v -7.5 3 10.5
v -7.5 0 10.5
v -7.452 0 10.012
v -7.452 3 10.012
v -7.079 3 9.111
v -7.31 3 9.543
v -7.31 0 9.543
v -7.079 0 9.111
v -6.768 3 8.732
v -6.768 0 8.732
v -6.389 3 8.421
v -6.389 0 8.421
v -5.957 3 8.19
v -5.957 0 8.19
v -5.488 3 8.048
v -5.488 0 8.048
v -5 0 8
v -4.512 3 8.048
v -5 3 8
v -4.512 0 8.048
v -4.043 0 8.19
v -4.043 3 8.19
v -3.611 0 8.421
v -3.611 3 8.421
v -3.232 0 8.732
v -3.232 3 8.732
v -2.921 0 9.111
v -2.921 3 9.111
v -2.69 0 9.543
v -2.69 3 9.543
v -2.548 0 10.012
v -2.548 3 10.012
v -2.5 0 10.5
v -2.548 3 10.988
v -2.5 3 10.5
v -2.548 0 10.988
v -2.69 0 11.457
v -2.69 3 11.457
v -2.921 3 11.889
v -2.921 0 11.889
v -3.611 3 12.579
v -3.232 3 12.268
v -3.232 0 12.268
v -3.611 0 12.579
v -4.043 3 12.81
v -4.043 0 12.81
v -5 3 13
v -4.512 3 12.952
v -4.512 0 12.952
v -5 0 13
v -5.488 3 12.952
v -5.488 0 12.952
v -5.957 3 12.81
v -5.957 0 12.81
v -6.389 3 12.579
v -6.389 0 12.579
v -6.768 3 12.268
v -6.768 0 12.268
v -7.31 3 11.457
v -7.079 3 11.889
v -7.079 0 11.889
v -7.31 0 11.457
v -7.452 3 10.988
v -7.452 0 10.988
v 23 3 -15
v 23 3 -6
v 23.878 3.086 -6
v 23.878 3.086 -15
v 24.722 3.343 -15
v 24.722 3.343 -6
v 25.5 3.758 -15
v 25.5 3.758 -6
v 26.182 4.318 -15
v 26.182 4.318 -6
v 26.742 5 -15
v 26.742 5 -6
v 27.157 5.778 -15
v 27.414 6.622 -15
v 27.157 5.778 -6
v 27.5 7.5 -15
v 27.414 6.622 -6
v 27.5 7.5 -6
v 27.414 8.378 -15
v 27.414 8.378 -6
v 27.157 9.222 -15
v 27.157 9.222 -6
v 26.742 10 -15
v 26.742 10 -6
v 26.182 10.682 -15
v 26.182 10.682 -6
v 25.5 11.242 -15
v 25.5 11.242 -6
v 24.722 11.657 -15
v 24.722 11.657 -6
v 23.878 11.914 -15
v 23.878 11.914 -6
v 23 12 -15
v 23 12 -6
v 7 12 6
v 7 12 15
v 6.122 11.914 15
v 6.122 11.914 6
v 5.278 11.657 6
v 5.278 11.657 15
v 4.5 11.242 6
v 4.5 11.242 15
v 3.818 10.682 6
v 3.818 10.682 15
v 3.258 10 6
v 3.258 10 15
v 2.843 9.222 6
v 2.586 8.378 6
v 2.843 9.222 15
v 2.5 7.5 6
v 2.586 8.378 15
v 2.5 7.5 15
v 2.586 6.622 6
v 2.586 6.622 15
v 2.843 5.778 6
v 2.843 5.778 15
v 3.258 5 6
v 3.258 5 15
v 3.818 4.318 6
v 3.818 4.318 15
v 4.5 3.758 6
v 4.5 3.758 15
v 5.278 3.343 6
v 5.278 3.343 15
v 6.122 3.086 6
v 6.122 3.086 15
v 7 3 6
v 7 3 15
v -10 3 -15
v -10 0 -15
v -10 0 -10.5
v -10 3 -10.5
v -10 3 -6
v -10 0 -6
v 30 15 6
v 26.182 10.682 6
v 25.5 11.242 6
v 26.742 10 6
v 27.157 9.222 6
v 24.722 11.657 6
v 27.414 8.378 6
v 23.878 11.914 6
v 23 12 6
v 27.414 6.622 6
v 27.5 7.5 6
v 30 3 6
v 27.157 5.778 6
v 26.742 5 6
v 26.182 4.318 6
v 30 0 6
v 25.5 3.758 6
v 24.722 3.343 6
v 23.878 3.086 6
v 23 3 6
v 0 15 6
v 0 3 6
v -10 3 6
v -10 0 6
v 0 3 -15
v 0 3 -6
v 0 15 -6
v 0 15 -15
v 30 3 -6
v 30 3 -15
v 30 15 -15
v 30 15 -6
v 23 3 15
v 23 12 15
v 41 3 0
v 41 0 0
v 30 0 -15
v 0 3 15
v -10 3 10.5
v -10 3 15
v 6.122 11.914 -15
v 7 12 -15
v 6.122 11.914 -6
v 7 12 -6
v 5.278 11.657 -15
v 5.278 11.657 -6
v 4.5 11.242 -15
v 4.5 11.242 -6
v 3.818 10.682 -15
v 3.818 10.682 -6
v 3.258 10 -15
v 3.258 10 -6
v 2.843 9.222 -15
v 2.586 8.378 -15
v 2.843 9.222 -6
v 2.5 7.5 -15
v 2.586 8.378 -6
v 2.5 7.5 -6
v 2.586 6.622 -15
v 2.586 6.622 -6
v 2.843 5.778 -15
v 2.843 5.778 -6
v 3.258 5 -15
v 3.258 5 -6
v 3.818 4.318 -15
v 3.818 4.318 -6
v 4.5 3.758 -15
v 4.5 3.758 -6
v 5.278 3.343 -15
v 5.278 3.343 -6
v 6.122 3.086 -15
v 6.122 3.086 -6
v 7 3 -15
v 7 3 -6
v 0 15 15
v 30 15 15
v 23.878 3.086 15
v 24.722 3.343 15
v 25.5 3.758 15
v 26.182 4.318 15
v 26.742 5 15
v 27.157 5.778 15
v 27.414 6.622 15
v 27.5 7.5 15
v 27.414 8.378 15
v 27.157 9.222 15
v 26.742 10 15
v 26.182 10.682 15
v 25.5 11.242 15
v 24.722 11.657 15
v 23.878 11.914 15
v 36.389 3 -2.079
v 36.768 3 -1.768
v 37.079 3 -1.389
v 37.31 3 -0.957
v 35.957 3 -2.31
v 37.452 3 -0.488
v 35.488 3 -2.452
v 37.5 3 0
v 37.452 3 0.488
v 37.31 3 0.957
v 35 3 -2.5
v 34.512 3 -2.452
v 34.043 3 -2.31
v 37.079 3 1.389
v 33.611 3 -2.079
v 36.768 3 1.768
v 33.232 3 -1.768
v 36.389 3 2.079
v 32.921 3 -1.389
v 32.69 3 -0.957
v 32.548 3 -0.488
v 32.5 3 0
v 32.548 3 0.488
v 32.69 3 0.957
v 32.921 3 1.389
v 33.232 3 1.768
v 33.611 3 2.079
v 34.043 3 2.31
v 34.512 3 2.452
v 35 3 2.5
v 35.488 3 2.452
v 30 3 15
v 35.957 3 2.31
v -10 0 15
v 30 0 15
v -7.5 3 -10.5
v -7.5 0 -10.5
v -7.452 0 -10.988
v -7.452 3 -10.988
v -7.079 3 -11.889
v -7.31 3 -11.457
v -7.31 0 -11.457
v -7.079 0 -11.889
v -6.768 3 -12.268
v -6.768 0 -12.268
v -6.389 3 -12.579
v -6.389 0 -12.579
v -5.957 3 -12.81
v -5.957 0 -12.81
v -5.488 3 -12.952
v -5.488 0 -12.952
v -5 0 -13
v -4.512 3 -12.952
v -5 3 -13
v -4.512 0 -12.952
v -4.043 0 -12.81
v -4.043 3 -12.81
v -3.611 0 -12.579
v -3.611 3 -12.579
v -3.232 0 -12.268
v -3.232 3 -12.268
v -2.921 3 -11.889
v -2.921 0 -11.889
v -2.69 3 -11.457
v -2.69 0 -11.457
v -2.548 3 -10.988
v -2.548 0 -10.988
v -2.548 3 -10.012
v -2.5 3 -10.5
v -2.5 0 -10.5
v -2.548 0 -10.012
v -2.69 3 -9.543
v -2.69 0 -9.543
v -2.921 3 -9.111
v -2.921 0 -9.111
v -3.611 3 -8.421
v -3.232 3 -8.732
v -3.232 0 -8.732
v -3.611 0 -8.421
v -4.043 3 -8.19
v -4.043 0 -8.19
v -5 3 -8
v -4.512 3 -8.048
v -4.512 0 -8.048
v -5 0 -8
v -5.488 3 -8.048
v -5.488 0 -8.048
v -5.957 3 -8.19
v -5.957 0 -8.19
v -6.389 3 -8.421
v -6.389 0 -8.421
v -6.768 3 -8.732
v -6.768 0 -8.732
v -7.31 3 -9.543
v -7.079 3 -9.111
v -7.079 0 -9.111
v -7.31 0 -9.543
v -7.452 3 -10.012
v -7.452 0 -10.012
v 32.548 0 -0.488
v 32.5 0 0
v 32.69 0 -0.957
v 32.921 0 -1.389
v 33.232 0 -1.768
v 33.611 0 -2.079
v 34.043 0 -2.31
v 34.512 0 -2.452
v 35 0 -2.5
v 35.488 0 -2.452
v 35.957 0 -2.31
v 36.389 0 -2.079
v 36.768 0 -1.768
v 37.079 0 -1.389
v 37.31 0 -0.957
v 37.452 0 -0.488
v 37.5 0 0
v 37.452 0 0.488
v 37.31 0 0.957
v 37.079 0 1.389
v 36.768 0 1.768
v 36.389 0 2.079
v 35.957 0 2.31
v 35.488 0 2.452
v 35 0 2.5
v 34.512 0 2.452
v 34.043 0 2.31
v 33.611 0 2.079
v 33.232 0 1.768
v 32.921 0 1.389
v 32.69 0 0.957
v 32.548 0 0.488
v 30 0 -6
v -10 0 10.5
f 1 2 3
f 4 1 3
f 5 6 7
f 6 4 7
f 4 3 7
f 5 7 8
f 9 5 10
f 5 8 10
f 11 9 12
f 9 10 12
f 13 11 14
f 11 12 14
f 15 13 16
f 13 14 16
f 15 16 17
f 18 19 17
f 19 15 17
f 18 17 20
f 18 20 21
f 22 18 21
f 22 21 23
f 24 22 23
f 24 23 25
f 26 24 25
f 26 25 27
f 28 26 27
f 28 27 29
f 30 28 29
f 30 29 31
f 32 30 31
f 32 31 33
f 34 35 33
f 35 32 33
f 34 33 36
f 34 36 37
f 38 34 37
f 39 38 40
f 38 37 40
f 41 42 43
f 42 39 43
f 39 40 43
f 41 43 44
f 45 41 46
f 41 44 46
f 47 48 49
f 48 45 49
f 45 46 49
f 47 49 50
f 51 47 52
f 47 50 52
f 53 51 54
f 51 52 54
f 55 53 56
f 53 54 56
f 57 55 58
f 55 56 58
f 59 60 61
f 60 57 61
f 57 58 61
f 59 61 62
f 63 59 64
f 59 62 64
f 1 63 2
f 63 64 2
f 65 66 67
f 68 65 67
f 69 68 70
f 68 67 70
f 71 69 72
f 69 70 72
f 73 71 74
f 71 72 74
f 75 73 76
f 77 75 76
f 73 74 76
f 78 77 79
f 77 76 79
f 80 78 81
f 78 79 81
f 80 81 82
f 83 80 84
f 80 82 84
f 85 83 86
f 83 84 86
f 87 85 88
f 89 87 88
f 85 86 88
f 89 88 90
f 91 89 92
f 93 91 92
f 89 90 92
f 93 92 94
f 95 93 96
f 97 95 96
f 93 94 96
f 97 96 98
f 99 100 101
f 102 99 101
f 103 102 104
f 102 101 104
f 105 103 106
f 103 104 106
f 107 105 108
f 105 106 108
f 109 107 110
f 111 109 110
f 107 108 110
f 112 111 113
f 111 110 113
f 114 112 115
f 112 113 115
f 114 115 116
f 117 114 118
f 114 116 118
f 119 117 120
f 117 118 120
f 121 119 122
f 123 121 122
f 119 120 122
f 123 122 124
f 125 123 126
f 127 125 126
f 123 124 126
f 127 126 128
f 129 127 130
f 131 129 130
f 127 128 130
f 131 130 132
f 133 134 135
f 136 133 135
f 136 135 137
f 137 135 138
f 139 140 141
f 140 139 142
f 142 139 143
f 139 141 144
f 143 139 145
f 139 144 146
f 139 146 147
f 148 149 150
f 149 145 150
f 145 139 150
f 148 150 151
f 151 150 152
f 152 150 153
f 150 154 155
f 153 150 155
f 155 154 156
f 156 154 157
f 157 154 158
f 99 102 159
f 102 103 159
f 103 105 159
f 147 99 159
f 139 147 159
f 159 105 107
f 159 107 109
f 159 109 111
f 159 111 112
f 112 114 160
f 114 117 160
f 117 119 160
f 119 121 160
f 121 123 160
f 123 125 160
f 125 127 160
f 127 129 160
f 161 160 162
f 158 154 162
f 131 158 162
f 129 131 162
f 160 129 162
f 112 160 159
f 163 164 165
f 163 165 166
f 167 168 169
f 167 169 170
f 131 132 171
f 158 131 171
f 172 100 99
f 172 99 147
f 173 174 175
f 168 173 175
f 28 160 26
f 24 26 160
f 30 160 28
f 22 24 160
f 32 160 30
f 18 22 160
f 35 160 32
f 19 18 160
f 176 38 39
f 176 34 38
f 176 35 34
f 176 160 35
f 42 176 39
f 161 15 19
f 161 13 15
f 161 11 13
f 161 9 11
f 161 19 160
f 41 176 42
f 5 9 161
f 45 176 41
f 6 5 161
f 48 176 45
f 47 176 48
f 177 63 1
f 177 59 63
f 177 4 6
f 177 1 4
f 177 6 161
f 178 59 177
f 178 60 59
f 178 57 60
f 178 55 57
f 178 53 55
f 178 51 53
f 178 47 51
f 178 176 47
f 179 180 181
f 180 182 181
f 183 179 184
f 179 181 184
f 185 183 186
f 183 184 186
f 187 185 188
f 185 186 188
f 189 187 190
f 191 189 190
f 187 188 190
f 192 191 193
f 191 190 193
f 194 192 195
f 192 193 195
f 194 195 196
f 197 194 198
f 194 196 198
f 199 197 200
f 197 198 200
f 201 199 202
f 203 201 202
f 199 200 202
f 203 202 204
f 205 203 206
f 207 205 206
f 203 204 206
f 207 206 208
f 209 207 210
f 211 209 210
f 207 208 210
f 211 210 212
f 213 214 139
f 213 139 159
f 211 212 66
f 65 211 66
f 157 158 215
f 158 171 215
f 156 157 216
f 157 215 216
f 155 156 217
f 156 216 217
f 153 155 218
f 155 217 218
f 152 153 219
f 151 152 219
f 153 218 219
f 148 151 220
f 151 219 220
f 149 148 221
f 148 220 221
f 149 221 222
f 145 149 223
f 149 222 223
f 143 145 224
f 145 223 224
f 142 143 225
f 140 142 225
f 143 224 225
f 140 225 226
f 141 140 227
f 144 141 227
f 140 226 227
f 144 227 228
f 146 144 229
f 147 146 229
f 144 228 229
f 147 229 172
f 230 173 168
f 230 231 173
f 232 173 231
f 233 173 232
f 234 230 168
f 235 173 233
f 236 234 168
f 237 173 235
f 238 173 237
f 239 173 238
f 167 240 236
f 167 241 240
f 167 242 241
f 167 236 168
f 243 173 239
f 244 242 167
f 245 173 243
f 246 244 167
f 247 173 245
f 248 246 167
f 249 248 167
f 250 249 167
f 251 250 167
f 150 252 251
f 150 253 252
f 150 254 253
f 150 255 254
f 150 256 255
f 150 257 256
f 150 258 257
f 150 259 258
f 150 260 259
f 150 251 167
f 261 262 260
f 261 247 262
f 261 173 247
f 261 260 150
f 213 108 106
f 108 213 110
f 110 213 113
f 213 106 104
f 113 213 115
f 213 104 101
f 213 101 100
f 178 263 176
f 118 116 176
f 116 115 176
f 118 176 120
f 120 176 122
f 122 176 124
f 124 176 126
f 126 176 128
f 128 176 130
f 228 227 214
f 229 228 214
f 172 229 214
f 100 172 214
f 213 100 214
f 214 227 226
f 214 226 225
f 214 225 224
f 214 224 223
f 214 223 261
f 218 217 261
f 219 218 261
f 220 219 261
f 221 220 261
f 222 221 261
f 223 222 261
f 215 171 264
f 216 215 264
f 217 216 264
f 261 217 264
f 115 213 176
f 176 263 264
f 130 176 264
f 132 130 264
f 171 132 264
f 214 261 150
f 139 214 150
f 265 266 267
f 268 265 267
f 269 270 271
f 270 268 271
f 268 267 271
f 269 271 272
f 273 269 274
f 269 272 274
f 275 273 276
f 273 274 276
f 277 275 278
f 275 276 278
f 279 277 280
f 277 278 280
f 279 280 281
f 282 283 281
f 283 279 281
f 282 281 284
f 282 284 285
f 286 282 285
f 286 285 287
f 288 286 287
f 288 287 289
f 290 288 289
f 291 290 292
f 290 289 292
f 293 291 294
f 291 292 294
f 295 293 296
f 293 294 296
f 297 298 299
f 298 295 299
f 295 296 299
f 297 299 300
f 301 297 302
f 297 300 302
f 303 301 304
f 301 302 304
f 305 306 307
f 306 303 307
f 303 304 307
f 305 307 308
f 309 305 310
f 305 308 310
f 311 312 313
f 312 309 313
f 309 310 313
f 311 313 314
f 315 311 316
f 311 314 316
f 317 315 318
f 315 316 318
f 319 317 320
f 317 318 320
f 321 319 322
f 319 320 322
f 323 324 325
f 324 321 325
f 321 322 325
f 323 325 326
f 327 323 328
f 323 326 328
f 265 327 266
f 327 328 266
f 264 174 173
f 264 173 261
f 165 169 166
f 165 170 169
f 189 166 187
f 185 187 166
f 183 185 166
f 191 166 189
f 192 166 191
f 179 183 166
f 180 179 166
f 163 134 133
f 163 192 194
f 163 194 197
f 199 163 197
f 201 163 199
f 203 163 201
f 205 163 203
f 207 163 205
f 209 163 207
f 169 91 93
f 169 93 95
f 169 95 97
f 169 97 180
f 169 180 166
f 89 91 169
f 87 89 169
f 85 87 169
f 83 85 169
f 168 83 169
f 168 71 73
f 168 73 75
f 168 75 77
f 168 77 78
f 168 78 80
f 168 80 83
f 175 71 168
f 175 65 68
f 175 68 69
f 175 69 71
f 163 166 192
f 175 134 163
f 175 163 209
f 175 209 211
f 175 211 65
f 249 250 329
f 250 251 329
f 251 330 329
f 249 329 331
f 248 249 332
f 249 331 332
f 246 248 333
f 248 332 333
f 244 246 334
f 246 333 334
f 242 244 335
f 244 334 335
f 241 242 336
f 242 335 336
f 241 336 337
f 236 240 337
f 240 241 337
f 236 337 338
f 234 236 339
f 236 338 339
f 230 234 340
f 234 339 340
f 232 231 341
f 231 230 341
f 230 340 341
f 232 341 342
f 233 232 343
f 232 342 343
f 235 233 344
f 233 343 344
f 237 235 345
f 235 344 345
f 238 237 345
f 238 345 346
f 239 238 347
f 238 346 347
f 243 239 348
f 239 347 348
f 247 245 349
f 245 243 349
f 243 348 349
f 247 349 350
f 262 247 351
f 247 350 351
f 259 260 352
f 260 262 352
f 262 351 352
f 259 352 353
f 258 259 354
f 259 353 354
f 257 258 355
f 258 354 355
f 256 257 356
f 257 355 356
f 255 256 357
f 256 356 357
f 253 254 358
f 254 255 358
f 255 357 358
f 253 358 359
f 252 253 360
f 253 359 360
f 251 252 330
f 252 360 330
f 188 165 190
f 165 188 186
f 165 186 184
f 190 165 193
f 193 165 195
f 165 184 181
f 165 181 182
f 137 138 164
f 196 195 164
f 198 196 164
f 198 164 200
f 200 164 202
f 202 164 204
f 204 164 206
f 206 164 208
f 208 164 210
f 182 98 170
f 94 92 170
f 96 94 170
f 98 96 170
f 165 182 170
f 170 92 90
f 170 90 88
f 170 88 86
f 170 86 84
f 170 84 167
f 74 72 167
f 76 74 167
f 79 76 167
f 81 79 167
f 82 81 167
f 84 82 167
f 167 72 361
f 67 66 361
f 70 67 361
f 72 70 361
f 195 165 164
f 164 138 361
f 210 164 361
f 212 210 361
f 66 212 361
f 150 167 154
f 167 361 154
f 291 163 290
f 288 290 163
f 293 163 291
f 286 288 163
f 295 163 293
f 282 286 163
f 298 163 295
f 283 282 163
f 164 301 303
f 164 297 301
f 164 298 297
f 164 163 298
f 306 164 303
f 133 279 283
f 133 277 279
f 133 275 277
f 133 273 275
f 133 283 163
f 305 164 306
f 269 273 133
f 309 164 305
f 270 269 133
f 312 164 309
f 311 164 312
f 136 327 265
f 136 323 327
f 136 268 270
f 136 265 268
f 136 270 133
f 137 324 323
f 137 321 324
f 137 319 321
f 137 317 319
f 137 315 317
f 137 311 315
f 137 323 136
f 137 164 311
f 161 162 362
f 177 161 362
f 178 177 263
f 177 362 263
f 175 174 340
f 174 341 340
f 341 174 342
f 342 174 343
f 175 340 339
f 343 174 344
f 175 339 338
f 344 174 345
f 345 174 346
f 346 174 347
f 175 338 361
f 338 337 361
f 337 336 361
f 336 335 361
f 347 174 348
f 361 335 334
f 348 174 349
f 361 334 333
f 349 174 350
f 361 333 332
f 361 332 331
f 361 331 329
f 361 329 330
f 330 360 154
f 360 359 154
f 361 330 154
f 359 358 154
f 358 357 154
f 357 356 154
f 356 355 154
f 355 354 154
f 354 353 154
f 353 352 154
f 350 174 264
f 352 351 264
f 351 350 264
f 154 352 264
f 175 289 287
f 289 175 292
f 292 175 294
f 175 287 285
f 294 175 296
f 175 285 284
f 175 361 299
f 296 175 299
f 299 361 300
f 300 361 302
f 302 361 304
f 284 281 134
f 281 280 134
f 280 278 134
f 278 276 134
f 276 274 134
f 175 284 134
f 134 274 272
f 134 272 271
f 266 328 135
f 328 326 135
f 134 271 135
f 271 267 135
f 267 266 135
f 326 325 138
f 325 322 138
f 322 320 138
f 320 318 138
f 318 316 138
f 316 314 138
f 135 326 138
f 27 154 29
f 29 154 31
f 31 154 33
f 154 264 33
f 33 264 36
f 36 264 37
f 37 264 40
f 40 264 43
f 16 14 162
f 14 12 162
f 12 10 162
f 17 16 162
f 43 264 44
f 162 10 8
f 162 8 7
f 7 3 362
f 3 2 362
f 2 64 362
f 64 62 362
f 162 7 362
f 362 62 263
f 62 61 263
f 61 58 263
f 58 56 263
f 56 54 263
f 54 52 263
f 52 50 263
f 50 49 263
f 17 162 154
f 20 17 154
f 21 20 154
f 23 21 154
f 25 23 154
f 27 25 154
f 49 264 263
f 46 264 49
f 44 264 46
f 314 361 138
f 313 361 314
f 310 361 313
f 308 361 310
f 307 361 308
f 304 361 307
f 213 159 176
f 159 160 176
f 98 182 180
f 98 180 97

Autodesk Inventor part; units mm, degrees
ref_plane "YZ Plane" through (0, 0, 0) normal (1, 0, 0) x (0, 1, 0)
ref_plane "XZ Plane" through (0, 0, 0) normal (0, 1, 0) x (-1, 0, 0)
ref_plane "XY Plane" through (0, 0, 0) normal (0, 0, 1) x (1, 0, 0)
sketch "Sketch1" plane through (0, 0, 0) normal (0, 1, 0) x (-1, 0, 0)
  circle A0 centre (0, 0) radius 3.2
  circle A1 centre (0, 0) radius 3.4
  circle A2 centre (0, 0) radius 5
  circle A3 centre (0, 0) radius 6
  line L0 (0, 0) -> (0, -15)
  line L1 (0, 0) -> (0, 15)
  line L2 (0, 0) -> (-9, 0)
  circle A4 centre (-9, 0) radius 3.75
  line L3 (0, 15) -> (0, 6)
  line L4 (0, 6) -> (10, 6)
  line L5 (10, 6) -> (10, 15)
  line L6 (10, 15) -> (0, 15)
  line L7 (10, 10.5) -> (5, 10.5)
  line L8 (0, -15) -> (10, -15)
  line L9 (10, -15) -> (10, -6)
  line L10 (10, -6) -> (0, -6)
  line L11 (10, -10.5) -> (5, -10.5)
  circle A5 centre (5, 10.5) radius 2.5
  circle A6 centre (5, -10.5) radius 2.5
  line L12 (0, -6) -> (-30, -6)
  line L13 (-30, -6) -> (-30, 6)
  line L14 (-30, 6) -> (0, 6)
  line L15 (0, 15) -> (-30, 15)
  line L16 (-30, 15) -> (-30, 6)
  line L17 (0, -15) -> (-30, -15)
  line L18 (-30, -15) -> (-30, -6)
  line L19 (-35, 0) -> (-41, 0)
  line L20 (-41, 0) -> (-30, -15)
  line L21 (-41, 0) -> (-30, 15)
  circle A7 centre (-35, 0) radius 2.5
  dimension "d3" = 12
  dimension "d0" = 6.4
  dimension "d1" = 6.8
  dimension "d2" = 10
  dimension "d4" = 15
  dimension "d5" = 15
  dimension "d6" = 9
  dimension "d7" = 7.5
  dimension "d8" = 10
  dimension "d9" = 5
  dimension "d10" = 10
  dimension "d11" = 10
  dimension "d12" = 5
  dimension "d13" = 5
  dimension "d14" = 5
  dimension "d15" = 30
  dimension "d17" = 6
  dimension "d18" = 5
extrude "Extrusion1" add sketch "Sketch1" along normal blind 3 contours L1 L6 L5 L4 | L10 L9 L8 L0 | L13 L18 L20 L21 L16
extrude "Extrusion2" add sketch "Sketch1" along normal blind 15 contours L14 L16 L15 L1 | L0 L17 L18 L12
sketch "Sketch2" plane through (-10, 0, 15) normal (0, 0, 1) x (1, 0, 0)
  line L0 (10, 15) -> (10, 7.5)
  line L1 (10, 3) -> (10, 15) projected
  line L2 (10, 7.5) -> (17, 7.5)
  arc A0 (17, 12) -> (17, 3) centre (17, 7.5) ccw
  line L3 (17, 7.5) -> (40, 7.5)
  line L4 (40, 3) -> (40, 15) projected
  line L5 (40, 7.5) -> (33, 7.5)
  arc A1 (33, 3) -> (33, 12) centre (33, 7.5) ccw
  line L6 (17, 3) -> (33, 3)
  line L7 (17, 12) -> (33, 12)
  point P0 (10, 0)
  dimension "d23" = 7.5
  dimension "d24" = 7
  dimension "d25" = 9
  dimension "d26" = 7
  dimension "d27" = 9
extrude "Extrusion3" cut sketch "Sketch2" against normal blind 31
properties part number "push_clip(1)"
